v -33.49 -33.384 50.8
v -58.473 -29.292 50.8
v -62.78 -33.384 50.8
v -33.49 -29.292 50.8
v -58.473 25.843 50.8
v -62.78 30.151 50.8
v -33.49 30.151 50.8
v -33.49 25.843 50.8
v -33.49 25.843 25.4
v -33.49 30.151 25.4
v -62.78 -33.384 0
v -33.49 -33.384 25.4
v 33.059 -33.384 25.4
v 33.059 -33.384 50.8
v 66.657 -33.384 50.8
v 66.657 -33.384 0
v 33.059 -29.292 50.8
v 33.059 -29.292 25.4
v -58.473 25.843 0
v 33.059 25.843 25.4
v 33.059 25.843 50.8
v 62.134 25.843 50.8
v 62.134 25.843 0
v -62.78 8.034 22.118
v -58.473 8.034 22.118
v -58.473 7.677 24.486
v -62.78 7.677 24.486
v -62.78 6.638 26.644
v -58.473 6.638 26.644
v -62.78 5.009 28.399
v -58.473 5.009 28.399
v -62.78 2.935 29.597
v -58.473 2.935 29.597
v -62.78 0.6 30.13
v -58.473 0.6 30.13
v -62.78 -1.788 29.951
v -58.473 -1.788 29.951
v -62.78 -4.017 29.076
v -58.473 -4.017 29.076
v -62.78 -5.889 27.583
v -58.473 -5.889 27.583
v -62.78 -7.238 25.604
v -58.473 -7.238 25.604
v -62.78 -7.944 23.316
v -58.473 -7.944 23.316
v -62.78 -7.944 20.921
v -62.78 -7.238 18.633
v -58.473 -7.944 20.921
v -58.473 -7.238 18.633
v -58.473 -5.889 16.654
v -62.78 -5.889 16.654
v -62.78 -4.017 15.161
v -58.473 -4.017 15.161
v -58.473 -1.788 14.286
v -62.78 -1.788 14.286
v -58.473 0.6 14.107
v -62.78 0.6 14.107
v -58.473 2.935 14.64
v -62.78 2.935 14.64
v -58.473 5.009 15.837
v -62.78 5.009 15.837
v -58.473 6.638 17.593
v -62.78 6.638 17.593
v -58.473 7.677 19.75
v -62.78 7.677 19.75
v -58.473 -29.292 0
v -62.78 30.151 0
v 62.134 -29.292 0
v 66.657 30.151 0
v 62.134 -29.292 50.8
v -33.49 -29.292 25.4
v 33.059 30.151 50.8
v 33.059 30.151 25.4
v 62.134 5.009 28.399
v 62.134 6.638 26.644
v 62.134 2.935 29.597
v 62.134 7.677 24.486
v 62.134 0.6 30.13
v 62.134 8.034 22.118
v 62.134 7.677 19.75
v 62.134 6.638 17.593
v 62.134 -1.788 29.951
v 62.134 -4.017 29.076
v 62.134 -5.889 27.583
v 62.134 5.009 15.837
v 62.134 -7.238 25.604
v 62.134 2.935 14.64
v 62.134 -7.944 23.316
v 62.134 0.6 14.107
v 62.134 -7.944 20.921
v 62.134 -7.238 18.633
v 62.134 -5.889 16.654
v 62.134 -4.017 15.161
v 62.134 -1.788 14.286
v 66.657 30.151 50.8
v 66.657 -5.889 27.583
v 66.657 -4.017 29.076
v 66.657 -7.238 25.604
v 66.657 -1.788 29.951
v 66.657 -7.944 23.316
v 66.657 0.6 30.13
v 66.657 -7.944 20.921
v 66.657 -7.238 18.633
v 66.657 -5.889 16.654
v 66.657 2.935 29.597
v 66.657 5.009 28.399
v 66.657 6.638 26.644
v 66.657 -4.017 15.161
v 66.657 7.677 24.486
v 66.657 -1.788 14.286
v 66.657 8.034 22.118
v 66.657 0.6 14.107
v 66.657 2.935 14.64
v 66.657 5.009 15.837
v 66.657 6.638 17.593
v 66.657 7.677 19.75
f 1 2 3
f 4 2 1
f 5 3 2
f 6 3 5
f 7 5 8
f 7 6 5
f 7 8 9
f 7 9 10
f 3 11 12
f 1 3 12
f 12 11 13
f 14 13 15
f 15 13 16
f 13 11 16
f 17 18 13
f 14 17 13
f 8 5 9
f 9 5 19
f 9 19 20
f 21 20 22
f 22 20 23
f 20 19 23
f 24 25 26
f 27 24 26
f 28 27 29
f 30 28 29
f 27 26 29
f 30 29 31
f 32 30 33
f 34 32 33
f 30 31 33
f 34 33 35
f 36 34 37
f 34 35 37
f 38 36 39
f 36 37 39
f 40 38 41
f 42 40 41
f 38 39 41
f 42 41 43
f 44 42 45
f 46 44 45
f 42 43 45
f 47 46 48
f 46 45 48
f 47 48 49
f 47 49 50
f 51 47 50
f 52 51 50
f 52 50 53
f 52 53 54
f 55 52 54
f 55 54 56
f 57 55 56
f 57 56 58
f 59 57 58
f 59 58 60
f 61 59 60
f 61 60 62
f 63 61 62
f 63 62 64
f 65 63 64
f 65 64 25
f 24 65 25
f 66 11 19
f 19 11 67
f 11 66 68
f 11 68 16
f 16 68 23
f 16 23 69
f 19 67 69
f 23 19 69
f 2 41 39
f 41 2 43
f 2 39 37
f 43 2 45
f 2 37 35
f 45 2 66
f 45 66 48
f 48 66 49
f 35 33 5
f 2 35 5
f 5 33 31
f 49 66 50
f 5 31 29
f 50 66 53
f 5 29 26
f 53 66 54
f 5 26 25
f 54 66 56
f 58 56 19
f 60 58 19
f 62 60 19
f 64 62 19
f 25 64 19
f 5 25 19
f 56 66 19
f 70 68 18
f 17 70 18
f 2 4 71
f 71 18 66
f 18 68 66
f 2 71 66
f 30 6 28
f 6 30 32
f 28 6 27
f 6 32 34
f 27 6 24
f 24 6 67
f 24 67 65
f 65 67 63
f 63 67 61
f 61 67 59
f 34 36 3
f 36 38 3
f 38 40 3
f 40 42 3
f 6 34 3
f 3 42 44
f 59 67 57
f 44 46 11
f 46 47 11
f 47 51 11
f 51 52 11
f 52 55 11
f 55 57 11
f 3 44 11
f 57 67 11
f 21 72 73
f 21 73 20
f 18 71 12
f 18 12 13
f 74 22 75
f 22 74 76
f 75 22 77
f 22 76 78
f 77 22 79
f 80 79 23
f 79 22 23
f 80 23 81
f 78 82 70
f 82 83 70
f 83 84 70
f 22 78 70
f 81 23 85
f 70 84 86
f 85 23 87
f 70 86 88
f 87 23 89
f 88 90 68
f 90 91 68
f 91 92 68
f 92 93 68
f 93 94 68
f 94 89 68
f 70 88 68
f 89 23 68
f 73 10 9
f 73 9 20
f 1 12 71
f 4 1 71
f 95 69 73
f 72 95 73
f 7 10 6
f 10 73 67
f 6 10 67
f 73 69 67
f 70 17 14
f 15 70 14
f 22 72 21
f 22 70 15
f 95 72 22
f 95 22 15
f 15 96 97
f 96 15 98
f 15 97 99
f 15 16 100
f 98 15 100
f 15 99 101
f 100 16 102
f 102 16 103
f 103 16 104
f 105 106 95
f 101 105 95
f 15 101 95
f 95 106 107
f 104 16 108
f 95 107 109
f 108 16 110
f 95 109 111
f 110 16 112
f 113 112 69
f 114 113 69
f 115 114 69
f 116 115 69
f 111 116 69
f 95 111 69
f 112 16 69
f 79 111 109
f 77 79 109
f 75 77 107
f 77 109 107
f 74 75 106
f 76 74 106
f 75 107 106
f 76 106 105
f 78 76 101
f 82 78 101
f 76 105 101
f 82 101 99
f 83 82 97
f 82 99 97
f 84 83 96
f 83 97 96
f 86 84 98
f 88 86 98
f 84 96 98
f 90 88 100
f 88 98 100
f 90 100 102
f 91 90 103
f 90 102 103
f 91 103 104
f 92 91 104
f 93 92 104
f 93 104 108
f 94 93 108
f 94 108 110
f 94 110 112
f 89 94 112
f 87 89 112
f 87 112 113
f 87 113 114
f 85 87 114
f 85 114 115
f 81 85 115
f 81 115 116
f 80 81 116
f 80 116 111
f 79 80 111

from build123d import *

# Parameters (mm, degrees)
F0_W     = 66.549368
F0_H     = 4.092034
F0_H_2   = 4.307404
F1_DEPTH = 25.4
F2_DEPTH = 50.8
F3_R     = 8.033842
F4_DEPTH = 131.064


with BuildPart() as f1:
    # F0 (on Top) → F1 (new body)
    with BuildSketch(Plane.XY):
        with Locations((-0.21537, -31.337576)):
            Rectangle(F0_W, F0_H)
        Polygon((-62.780388, 30.150594), (-62.780388, -33.383593), (-33.490054, -33.383593), (-33.490054, -29.291559), (-58.472987, -29.291559), (-58.472987, 25.84319), (-33.490054, 25.84319), (-33.490054, 30.150594), align=None)
        with Locations((-0.21537, 27.996892)):
            Rectangle(F0_W, F0_H_2)
        Polygon((33.059314, -29.291559), (33.059314, -33.383593), (66.657059, -33.383593), (66.657059, 30.150594), (33.059314, 30.150594), (33.059314, 25.84319), (62.134281, 25.84319), (62.134281, -29.291559), align=None)
    extrude(amount=F1_DEPTH)

    # F0 (on Top) → F2 (join)
    with BuildSketch(Plane.XY):
        Polygon((-62.780388, 30.150594), (-62.780388, -33.383593), (-33.490054, -33.383593), (-33.490054, -29.291559), (-58.472987, -29.291559), (-58.472987, 25.84319), (-33.490054, 25.84319), (-33.490054, 30.150594), align=None)
        Polygon((33.059314, -29.291559), (33.059314, -33.383593), (66.657059, -33.383593), (66.657059, 30.150594), (33.059314, 30.150594), (33.059314, 25.84319), (62.134281, 25.84319), (62.134281, -29.291559), align=None)
    extrude(amount=F2_DEPTH)

    # F3 (on face) → F4 (cut)
    with BuildSketch(Plane.YZ.offset(66.657059)):
        with Locations((0, 22.118356)):
            Circle(F3_R)
    extrude(amount=-F4_DEPTH, mode=Mode.SUBTRACT)


solid = f1.part
